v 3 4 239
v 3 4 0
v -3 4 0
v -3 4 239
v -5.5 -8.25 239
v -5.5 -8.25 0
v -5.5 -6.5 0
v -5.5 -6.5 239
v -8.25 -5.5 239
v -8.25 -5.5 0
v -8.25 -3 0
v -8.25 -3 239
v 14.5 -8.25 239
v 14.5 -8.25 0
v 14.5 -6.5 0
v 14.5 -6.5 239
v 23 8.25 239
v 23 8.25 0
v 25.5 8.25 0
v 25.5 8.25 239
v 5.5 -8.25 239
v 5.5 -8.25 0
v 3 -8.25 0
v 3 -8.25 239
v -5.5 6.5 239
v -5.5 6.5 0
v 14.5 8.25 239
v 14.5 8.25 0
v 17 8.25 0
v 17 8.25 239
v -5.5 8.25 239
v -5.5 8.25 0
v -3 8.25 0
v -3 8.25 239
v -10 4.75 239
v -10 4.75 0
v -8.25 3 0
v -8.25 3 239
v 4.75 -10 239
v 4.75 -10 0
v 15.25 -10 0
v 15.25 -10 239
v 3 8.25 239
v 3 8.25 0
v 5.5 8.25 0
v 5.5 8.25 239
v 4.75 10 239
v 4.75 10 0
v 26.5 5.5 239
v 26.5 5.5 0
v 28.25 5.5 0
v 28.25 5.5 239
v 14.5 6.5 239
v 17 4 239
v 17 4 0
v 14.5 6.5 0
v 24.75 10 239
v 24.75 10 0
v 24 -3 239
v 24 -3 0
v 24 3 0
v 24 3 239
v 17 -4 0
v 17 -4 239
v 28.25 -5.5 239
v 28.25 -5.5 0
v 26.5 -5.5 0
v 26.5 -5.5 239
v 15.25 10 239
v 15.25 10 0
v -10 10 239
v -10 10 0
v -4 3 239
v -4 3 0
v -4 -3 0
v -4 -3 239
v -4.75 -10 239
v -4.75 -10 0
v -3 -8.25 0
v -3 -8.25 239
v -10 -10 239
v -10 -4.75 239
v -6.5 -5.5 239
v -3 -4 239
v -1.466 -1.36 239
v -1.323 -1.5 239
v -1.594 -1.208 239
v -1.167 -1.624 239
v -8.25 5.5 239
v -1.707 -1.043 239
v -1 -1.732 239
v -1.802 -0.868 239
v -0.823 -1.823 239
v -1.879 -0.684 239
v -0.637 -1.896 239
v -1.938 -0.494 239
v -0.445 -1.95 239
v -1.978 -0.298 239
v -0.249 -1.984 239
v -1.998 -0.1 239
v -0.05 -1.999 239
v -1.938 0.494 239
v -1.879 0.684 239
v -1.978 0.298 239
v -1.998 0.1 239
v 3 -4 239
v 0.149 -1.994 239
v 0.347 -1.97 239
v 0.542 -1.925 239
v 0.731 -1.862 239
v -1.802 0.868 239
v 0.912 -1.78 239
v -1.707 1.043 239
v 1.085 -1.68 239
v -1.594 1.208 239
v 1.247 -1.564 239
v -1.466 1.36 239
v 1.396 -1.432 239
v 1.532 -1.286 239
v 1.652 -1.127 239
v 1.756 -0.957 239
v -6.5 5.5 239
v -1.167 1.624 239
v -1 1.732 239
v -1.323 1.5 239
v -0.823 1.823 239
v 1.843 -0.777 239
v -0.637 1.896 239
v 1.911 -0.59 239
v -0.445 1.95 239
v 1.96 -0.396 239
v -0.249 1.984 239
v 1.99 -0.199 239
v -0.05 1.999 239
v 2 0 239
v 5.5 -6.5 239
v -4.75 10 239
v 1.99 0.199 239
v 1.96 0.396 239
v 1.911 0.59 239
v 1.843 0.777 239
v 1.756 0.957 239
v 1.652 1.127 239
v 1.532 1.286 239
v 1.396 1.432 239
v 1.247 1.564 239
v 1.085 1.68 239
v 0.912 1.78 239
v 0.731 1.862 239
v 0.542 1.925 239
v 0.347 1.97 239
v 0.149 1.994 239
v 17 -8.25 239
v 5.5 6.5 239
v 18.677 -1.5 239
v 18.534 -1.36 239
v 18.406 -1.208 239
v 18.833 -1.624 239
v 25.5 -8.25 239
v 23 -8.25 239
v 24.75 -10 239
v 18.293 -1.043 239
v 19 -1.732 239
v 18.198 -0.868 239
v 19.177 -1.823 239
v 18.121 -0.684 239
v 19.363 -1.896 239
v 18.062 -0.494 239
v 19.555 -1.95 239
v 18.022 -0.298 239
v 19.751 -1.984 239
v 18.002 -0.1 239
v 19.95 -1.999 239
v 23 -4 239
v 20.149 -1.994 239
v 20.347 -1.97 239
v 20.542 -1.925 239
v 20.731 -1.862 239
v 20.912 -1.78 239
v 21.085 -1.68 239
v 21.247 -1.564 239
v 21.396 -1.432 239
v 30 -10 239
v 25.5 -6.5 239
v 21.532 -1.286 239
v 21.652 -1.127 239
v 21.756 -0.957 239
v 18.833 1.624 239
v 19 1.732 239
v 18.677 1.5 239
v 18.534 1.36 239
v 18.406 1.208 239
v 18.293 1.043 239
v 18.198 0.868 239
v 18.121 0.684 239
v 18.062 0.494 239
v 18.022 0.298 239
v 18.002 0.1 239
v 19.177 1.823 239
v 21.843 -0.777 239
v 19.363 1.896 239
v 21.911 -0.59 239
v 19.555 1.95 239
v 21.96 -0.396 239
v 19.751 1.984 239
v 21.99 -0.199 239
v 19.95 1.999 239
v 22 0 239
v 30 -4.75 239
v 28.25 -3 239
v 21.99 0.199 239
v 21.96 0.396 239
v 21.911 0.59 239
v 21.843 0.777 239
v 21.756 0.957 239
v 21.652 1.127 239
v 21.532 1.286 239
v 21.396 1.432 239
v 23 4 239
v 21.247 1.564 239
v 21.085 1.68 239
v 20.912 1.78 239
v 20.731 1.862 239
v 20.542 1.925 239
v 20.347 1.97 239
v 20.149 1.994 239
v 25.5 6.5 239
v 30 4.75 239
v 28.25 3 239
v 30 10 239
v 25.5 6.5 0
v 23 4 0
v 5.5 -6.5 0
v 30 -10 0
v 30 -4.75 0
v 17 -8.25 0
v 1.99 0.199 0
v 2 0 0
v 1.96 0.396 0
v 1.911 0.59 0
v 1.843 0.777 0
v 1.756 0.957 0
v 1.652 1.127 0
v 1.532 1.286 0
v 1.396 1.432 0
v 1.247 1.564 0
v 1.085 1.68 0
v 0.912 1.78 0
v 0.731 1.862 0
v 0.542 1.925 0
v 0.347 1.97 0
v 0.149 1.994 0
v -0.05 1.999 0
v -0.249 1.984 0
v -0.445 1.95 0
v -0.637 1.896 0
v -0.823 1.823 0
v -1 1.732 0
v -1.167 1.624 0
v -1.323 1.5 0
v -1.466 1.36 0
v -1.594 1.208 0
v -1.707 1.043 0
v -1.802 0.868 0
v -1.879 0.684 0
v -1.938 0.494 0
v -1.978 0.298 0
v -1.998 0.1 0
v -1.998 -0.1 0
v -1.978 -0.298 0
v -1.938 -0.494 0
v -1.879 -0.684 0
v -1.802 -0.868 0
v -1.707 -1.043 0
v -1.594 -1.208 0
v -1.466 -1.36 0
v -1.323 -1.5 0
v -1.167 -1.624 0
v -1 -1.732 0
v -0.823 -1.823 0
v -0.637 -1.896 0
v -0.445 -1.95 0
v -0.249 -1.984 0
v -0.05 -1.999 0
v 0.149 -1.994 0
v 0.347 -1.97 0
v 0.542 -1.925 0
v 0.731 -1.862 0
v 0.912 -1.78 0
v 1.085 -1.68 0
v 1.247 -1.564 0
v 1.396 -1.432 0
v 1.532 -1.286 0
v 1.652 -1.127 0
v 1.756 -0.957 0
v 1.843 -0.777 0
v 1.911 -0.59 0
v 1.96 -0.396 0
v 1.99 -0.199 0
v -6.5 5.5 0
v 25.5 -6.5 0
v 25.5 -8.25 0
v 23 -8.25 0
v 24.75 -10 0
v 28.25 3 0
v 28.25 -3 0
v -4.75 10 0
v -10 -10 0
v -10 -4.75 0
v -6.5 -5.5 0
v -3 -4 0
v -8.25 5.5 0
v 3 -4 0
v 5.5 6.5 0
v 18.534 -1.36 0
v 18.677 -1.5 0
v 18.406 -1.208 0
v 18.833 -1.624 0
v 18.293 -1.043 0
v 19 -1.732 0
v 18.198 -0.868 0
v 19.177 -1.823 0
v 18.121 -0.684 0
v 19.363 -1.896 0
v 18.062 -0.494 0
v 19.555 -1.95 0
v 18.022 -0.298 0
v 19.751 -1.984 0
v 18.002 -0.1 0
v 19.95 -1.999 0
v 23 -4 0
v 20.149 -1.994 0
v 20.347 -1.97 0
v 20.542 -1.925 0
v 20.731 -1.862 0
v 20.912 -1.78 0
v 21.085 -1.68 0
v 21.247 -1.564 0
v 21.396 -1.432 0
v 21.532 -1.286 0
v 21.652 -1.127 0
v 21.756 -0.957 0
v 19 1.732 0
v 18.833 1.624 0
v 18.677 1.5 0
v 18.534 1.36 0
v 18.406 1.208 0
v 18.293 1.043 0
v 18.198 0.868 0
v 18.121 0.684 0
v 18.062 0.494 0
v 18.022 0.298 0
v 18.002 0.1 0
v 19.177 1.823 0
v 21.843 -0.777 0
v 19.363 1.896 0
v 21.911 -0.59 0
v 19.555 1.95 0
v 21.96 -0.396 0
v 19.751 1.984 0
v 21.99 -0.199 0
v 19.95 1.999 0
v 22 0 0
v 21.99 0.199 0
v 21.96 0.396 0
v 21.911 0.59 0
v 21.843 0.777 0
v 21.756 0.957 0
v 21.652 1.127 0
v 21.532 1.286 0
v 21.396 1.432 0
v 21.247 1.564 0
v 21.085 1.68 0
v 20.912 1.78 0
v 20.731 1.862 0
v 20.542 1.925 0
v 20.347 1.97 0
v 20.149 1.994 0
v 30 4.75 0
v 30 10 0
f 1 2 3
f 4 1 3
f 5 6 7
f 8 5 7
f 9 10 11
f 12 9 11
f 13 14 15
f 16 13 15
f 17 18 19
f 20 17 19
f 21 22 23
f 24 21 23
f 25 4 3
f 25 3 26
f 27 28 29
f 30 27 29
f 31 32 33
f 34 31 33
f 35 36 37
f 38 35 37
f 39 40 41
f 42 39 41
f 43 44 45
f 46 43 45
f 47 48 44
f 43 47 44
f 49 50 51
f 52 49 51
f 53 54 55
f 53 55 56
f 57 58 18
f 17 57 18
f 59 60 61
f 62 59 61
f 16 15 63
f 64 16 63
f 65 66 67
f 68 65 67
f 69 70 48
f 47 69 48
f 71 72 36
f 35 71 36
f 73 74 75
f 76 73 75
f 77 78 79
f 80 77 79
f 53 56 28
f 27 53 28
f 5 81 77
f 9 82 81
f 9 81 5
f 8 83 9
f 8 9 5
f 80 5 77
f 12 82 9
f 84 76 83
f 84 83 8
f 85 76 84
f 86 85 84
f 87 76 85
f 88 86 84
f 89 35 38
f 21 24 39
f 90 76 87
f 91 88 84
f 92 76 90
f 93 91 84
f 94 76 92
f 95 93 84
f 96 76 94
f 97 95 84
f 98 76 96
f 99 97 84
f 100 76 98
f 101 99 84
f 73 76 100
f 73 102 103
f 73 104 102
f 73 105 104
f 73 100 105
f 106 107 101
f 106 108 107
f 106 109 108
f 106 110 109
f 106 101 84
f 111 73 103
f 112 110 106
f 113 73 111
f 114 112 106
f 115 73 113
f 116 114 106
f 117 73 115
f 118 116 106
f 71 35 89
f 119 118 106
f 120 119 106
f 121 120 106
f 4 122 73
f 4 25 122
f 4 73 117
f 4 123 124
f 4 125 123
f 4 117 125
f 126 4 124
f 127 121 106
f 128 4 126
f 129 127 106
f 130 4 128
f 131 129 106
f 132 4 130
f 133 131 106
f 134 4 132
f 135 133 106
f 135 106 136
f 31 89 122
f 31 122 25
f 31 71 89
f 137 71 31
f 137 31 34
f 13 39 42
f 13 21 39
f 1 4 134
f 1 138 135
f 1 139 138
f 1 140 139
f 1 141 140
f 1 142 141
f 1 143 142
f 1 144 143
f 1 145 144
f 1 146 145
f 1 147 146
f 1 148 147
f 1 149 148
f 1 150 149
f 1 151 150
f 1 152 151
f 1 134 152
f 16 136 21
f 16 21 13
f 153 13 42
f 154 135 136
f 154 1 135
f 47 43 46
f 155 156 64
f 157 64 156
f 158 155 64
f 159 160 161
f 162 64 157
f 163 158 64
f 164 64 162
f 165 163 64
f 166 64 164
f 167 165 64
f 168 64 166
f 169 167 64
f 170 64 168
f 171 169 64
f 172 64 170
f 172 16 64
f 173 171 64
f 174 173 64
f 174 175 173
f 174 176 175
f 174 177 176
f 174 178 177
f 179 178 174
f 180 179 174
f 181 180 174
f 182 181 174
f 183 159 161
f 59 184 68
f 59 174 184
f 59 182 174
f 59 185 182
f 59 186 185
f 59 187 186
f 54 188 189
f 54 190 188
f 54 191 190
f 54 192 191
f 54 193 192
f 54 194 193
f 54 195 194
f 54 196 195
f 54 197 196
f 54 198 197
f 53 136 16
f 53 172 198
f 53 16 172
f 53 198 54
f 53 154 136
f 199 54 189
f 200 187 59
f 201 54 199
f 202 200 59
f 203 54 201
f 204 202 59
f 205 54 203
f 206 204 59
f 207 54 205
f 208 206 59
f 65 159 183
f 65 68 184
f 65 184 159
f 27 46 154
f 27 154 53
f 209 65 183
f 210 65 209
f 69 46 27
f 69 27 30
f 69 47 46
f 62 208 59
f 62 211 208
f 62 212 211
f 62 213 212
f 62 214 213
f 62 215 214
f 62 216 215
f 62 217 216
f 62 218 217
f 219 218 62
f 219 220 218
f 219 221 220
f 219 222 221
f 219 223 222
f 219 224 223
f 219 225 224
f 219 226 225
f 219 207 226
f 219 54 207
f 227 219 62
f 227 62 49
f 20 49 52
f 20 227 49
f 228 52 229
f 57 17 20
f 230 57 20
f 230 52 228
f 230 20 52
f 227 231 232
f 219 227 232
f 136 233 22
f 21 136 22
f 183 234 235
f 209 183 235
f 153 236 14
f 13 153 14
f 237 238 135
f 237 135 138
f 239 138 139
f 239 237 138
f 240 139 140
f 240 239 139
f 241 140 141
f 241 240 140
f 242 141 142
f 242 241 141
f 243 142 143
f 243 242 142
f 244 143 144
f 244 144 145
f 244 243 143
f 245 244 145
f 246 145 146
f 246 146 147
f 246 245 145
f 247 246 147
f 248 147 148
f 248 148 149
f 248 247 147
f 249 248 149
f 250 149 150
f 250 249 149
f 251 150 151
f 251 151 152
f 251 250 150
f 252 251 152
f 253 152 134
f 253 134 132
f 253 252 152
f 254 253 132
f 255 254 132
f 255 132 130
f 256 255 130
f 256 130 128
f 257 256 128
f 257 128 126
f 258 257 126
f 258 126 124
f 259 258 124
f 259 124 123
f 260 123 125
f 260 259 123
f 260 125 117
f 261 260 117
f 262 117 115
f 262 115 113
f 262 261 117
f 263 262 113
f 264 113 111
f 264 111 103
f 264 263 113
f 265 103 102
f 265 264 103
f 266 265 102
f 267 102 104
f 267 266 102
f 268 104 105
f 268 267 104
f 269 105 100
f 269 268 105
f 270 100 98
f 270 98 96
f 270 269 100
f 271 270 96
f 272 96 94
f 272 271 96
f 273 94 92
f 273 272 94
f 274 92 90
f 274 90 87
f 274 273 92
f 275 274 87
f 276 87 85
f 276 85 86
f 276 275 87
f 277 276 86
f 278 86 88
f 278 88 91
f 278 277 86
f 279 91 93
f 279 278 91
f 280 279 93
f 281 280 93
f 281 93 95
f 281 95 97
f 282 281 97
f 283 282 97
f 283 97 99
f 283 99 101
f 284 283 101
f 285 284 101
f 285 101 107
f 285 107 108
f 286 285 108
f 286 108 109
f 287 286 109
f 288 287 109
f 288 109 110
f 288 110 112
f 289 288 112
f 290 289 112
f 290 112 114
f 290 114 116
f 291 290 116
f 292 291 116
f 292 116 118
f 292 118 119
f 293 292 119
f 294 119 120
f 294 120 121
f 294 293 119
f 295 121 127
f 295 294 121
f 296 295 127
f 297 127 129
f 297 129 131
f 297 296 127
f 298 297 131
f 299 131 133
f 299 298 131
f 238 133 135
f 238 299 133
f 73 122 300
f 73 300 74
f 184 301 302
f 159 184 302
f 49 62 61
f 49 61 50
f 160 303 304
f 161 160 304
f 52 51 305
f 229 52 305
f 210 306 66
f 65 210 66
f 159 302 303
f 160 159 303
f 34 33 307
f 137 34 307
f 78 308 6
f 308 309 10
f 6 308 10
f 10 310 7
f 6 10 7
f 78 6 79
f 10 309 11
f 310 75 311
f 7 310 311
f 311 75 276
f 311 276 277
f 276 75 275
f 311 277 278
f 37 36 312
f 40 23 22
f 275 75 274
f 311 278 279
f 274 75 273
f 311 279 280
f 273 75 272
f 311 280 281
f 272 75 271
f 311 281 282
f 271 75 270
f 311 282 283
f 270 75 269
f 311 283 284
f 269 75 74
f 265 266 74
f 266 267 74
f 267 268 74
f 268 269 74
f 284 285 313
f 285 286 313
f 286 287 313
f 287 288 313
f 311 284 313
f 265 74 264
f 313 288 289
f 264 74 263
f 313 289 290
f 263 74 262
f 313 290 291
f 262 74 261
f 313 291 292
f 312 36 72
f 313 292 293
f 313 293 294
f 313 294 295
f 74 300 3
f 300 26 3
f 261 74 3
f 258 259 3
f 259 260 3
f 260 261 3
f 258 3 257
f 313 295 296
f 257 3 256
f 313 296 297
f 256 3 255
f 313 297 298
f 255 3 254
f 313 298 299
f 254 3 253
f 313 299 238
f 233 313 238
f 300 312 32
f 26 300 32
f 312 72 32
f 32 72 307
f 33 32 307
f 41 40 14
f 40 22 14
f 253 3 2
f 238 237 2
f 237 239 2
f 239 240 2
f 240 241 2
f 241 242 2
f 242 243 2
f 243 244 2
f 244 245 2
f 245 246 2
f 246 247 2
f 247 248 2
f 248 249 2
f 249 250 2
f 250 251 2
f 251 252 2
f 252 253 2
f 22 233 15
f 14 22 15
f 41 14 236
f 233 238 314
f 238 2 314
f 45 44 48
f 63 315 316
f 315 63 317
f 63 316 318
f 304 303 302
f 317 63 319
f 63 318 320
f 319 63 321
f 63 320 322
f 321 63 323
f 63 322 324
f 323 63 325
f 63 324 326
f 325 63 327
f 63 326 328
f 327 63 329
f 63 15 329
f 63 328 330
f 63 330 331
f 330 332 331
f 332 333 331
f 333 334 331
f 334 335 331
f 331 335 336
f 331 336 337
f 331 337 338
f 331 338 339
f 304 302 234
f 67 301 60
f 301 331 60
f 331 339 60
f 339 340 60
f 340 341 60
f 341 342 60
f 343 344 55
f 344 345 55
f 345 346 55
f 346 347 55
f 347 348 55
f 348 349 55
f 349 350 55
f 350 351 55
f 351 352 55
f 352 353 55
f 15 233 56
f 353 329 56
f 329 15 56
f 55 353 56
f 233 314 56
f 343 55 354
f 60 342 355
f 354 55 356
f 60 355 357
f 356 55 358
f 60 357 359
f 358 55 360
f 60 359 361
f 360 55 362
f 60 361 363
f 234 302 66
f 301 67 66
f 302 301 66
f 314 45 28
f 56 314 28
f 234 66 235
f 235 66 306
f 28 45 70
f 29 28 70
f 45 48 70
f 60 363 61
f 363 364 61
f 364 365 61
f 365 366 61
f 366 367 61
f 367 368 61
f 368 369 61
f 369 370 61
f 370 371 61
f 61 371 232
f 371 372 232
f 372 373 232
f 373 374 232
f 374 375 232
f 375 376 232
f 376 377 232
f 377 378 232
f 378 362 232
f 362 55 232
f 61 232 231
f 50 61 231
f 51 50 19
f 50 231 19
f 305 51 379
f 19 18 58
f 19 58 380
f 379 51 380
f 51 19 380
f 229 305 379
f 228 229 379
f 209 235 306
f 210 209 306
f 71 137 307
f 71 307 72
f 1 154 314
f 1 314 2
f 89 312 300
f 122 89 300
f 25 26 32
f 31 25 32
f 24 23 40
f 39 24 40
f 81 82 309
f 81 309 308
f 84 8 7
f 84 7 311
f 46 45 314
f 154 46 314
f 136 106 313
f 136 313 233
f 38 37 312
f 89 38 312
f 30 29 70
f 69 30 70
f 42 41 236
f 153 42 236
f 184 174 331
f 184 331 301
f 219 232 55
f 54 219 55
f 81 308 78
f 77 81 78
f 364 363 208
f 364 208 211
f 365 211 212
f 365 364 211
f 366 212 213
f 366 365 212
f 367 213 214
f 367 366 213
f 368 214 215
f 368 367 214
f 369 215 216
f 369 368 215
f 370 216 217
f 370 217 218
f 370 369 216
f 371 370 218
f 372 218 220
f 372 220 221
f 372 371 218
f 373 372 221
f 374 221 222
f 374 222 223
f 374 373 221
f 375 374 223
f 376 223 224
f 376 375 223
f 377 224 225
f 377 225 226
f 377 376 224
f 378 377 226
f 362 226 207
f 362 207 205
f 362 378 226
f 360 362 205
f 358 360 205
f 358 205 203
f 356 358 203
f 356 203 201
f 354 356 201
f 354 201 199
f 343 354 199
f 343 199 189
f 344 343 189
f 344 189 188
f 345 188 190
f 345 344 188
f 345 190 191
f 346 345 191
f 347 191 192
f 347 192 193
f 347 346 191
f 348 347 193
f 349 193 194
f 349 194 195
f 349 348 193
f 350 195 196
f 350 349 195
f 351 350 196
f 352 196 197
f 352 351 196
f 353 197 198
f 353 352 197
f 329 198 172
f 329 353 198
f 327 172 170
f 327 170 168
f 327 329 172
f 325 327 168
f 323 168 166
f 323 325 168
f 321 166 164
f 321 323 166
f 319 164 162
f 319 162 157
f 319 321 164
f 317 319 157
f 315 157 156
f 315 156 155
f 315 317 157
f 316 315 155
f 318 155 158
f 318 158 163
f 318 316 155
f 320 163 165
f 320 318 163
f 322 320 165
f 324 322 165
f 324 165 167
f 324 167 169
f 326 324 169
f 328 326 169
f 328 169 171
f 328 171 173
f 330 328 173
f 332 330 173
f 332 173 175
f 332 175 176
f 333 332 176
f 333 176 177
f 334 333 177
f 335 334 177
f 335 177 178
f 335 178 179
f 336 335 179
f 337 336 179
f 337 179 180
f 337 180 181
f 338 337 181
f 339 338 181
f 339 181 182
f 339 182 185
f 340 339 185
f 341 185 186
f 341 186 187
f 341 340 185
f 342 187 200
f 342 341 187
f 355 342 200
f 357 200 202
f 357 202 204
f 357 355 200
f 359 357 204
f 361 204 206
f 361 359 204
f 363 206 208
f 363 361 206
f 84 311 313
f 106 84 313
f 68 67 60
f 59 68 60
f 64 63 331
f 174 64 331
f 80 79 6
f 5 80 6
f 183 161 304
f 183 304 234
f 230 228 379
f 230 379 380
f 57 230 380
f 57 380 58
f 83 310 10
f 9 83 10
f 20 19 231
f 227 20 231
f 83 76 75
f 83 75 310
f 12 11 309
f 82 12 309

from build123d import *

# Parameters (mm, degrees)
CROQUIS1_R              = 2
SALIENTE_EXTRUIR1_DEPTH = 239


with BuildPart() as part:
    # Croquis1 → Saliente-Extruir1 (new body)
    with BuildSketch(Plane.XY):
        Polygon((-4.75, 10), (-10, 10), (-10, 4.75), (-8.25, 3), (-8.25, 5.5), (-6.5, 5.5), (-4, 3), (-4, -3), (-6.5, -5.5), (-8.25, -5.5), (-8.25, -3), (-10, -4.75), (-10, -10), (-4.75, -10), (-3, -8.25), (-5.5, -8.25), (-5.5, -6.5), (-3, -4), (3, -4), (5.5, -6.5), (5.5, -8.25), (3, -8.25), (4.75, -10), (10, -10), (10, -4.75), (8.25, -3), (8.25, -5.5), (6.5, -5.5), (4, -3), (4, 3), (6.5, 5.5), (8.25, 5.5), (8.25, 3), (10, 4.75), (10, 10), (4.75, 10), (3, 8.25), (5.5, 8.25), (5.5, 6.5), (3, 4), (-3, 4), (-5.5, 6.5), (-5.5, 8.25), (-3, 8.25), align=None)
        Circle(CROQUIS1_R, mode=Mode.SUBTRACT)
        Polygon((15.25, 10), (10, 10), (10, 4.75), (11.75, 3), (11.75, 5.5), (13.5, 5.5), (16, 3), (16, -3), (13.5, -5.5), (11.75, -5.5), (11.75, -3), (10, -4.75), (10, -10), (15.25, -10), (17, -8.25), (14.5, -8.25), (14.5, -6.5), (17, -4), (23, -4), (25.5, -6.5), (25.5, -8.25), (23, -8.25), (24.75, -10), (30, -10), (30, -4.75), (28.25, -3), (28.25, -5.5), (26.5, -5.5), (24, -3), (24, 3), (26.5, 5.5), (28.25, 5.5), (28.25, 3), (30, 4.75), (30, 10), (24.75, 10), (23, 8.25), (25.5, 8.25), (25.5, 6.5), (23, 4), (17, 4), (14.5, 6.5), (14.5, 8.25), (17, 8.25), align=None)
        with Locations((20, 0)):
            Circle(CROQUIS1_R, mode=Mode.SUBTRACT)
        Polygon((11.75, 3), (10, 4.75), (10, -4.75), (11.75, -3), (11.75, -5.5), (13.5, -5.5), (16, -3), (16, 3), (13.5, 5.5), (11.75, 5.5), align=None)
        Polygon((10, -4.75), (10, 4.75), (8.25, 3), (8.25, 5.5), (6.5, 5.5), (4, 3), (4, -3), (6.5, -5.5), (8.25, -5.5), (8.25, -3), align=None)
    extrude(amount=SALIENTE_EXTRUIR1_DEPTH)


solid = part.part
